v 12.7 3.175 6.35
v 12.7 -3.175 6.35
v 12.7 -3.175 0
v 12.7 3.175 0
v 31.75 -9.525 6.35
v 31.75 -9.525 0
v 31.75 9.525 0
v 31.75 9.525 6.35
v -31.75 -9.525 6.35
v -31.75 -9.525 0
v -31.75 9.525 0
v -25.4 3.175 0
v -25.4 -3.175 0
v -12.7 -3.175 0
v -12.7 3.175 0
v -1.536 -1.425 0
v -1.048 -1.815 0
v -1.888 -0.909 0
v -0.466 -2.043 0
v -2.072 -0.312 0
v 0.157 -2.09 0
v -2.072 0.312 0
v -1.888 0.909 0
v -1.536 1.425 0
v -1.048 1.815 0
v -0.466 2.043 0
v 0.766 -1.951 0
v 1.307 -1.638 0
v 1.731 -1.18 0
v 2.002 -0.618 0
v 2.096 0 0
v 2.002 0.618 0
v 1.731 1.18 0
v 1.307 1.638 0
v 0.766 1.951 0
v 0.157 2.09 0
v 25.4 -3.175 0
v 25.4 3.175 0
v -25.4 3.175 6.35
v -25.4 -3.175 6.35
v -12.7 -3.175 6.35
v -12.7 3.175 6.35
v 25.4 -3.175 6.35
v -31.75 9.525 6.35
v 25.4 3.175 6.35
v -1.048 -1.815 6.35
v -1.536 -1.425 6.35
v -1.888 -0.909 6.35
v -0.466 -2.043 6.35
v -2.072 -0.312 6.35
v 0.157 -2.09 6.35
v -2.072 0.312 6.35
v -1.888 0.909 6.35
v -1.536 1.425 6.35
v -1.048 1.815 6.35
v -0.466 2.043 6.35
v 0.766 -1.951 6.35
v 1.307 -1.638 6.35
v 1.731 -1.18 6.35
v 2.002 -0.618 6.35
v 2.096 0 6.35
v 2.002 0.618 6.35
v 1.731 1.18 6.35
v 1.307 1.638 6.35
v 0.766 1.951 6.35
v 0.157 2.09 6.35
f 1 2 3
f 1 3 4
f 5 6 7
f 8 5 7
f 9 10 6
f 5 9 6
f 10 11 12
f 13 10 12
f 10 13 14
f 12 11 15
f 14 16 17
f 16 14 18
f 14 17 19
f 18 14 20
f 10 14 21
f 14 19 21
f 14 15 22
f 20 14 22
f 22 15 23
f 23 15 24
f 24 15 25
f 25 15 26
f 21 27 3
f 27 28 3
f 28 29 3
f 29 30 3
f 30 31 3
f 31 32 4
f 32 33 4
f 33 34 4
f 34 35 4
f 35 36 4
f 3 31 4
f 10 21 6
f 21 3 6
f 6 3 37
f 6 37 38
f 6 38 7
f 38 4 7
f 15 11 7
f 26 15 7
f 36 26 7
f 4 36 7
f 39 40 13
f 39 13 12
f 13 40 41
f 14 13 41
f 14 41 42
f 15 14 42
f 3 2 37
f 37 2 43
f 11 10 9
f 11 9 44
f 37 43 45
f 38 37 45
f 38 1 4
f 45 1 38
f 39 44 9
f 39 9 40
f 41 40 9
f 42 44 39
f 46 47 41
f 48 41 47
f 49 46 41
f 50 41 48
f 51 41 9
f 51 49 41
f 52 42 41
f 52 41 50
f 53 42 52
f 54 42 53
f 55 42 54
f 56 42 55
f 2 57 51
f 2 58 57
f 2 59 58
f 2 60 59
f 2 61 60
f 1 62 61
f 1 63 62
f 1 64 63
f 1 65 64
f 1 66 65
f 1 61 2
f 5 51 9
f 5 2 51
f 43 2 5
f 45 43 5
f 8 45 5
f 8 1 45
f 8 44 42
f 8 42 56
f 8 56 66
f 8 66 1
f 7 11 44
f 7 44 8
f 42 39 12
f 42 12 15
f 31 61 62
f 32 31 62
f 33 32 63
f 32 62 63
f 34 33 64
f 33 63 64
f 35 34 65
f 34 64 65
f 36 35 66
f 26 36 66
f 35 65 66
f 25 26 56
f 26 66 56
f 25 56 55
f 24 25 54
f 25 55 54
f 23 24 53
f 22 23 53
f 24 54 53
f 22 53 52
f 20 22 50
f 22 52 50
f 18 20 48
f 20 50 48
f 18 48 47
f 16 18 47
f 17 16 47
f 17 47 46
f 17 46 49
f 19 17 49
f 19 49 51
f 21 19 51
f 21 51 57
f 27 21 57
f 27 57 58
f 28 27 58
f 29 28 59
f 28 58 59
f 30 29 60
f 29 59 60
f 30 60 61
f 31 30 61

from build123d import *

# Parameters (mm, degrees)
SKETCH1_W           = 63.5
SKETCH1_H           = 19.05
BOSS_EXTRUDE1_DEPTH = 6.35
SKETCH2_R           = 2.0955
SKETCH2_W           = 12.7
SKETCH2_H           = 6.35
CUT_EXTRUDE1_DEPTH  = 6.35


with BuildPart() as part:
    # Sketch1 → Boss-Extrude1 (new body)
    with BuildSketch(Plane.XY):
        Rectangle(SKETCH1_W, SKETCH1_H)
    extrude(amount=BOSS_EXTRUDE1_DEPTH)

    # Sketch2 → Cut-Extrude1 (cut)
    with BuildSketch(Plane.XY.offset(6.35)):
        Circle(SKETCH2_R)
        with Locations((-19.05, 0)):
            Rectangle(SKETCH2_W, SKETCH2_H)
        with Locations((19.05, 0)):
            Rectangle(SKETCH2_W, SKETCH2_H)
    extrude(amount=-CUT_EXTRUDE1_DEPTH, mode=Mode.SUBTRACT)


solid = part.part
